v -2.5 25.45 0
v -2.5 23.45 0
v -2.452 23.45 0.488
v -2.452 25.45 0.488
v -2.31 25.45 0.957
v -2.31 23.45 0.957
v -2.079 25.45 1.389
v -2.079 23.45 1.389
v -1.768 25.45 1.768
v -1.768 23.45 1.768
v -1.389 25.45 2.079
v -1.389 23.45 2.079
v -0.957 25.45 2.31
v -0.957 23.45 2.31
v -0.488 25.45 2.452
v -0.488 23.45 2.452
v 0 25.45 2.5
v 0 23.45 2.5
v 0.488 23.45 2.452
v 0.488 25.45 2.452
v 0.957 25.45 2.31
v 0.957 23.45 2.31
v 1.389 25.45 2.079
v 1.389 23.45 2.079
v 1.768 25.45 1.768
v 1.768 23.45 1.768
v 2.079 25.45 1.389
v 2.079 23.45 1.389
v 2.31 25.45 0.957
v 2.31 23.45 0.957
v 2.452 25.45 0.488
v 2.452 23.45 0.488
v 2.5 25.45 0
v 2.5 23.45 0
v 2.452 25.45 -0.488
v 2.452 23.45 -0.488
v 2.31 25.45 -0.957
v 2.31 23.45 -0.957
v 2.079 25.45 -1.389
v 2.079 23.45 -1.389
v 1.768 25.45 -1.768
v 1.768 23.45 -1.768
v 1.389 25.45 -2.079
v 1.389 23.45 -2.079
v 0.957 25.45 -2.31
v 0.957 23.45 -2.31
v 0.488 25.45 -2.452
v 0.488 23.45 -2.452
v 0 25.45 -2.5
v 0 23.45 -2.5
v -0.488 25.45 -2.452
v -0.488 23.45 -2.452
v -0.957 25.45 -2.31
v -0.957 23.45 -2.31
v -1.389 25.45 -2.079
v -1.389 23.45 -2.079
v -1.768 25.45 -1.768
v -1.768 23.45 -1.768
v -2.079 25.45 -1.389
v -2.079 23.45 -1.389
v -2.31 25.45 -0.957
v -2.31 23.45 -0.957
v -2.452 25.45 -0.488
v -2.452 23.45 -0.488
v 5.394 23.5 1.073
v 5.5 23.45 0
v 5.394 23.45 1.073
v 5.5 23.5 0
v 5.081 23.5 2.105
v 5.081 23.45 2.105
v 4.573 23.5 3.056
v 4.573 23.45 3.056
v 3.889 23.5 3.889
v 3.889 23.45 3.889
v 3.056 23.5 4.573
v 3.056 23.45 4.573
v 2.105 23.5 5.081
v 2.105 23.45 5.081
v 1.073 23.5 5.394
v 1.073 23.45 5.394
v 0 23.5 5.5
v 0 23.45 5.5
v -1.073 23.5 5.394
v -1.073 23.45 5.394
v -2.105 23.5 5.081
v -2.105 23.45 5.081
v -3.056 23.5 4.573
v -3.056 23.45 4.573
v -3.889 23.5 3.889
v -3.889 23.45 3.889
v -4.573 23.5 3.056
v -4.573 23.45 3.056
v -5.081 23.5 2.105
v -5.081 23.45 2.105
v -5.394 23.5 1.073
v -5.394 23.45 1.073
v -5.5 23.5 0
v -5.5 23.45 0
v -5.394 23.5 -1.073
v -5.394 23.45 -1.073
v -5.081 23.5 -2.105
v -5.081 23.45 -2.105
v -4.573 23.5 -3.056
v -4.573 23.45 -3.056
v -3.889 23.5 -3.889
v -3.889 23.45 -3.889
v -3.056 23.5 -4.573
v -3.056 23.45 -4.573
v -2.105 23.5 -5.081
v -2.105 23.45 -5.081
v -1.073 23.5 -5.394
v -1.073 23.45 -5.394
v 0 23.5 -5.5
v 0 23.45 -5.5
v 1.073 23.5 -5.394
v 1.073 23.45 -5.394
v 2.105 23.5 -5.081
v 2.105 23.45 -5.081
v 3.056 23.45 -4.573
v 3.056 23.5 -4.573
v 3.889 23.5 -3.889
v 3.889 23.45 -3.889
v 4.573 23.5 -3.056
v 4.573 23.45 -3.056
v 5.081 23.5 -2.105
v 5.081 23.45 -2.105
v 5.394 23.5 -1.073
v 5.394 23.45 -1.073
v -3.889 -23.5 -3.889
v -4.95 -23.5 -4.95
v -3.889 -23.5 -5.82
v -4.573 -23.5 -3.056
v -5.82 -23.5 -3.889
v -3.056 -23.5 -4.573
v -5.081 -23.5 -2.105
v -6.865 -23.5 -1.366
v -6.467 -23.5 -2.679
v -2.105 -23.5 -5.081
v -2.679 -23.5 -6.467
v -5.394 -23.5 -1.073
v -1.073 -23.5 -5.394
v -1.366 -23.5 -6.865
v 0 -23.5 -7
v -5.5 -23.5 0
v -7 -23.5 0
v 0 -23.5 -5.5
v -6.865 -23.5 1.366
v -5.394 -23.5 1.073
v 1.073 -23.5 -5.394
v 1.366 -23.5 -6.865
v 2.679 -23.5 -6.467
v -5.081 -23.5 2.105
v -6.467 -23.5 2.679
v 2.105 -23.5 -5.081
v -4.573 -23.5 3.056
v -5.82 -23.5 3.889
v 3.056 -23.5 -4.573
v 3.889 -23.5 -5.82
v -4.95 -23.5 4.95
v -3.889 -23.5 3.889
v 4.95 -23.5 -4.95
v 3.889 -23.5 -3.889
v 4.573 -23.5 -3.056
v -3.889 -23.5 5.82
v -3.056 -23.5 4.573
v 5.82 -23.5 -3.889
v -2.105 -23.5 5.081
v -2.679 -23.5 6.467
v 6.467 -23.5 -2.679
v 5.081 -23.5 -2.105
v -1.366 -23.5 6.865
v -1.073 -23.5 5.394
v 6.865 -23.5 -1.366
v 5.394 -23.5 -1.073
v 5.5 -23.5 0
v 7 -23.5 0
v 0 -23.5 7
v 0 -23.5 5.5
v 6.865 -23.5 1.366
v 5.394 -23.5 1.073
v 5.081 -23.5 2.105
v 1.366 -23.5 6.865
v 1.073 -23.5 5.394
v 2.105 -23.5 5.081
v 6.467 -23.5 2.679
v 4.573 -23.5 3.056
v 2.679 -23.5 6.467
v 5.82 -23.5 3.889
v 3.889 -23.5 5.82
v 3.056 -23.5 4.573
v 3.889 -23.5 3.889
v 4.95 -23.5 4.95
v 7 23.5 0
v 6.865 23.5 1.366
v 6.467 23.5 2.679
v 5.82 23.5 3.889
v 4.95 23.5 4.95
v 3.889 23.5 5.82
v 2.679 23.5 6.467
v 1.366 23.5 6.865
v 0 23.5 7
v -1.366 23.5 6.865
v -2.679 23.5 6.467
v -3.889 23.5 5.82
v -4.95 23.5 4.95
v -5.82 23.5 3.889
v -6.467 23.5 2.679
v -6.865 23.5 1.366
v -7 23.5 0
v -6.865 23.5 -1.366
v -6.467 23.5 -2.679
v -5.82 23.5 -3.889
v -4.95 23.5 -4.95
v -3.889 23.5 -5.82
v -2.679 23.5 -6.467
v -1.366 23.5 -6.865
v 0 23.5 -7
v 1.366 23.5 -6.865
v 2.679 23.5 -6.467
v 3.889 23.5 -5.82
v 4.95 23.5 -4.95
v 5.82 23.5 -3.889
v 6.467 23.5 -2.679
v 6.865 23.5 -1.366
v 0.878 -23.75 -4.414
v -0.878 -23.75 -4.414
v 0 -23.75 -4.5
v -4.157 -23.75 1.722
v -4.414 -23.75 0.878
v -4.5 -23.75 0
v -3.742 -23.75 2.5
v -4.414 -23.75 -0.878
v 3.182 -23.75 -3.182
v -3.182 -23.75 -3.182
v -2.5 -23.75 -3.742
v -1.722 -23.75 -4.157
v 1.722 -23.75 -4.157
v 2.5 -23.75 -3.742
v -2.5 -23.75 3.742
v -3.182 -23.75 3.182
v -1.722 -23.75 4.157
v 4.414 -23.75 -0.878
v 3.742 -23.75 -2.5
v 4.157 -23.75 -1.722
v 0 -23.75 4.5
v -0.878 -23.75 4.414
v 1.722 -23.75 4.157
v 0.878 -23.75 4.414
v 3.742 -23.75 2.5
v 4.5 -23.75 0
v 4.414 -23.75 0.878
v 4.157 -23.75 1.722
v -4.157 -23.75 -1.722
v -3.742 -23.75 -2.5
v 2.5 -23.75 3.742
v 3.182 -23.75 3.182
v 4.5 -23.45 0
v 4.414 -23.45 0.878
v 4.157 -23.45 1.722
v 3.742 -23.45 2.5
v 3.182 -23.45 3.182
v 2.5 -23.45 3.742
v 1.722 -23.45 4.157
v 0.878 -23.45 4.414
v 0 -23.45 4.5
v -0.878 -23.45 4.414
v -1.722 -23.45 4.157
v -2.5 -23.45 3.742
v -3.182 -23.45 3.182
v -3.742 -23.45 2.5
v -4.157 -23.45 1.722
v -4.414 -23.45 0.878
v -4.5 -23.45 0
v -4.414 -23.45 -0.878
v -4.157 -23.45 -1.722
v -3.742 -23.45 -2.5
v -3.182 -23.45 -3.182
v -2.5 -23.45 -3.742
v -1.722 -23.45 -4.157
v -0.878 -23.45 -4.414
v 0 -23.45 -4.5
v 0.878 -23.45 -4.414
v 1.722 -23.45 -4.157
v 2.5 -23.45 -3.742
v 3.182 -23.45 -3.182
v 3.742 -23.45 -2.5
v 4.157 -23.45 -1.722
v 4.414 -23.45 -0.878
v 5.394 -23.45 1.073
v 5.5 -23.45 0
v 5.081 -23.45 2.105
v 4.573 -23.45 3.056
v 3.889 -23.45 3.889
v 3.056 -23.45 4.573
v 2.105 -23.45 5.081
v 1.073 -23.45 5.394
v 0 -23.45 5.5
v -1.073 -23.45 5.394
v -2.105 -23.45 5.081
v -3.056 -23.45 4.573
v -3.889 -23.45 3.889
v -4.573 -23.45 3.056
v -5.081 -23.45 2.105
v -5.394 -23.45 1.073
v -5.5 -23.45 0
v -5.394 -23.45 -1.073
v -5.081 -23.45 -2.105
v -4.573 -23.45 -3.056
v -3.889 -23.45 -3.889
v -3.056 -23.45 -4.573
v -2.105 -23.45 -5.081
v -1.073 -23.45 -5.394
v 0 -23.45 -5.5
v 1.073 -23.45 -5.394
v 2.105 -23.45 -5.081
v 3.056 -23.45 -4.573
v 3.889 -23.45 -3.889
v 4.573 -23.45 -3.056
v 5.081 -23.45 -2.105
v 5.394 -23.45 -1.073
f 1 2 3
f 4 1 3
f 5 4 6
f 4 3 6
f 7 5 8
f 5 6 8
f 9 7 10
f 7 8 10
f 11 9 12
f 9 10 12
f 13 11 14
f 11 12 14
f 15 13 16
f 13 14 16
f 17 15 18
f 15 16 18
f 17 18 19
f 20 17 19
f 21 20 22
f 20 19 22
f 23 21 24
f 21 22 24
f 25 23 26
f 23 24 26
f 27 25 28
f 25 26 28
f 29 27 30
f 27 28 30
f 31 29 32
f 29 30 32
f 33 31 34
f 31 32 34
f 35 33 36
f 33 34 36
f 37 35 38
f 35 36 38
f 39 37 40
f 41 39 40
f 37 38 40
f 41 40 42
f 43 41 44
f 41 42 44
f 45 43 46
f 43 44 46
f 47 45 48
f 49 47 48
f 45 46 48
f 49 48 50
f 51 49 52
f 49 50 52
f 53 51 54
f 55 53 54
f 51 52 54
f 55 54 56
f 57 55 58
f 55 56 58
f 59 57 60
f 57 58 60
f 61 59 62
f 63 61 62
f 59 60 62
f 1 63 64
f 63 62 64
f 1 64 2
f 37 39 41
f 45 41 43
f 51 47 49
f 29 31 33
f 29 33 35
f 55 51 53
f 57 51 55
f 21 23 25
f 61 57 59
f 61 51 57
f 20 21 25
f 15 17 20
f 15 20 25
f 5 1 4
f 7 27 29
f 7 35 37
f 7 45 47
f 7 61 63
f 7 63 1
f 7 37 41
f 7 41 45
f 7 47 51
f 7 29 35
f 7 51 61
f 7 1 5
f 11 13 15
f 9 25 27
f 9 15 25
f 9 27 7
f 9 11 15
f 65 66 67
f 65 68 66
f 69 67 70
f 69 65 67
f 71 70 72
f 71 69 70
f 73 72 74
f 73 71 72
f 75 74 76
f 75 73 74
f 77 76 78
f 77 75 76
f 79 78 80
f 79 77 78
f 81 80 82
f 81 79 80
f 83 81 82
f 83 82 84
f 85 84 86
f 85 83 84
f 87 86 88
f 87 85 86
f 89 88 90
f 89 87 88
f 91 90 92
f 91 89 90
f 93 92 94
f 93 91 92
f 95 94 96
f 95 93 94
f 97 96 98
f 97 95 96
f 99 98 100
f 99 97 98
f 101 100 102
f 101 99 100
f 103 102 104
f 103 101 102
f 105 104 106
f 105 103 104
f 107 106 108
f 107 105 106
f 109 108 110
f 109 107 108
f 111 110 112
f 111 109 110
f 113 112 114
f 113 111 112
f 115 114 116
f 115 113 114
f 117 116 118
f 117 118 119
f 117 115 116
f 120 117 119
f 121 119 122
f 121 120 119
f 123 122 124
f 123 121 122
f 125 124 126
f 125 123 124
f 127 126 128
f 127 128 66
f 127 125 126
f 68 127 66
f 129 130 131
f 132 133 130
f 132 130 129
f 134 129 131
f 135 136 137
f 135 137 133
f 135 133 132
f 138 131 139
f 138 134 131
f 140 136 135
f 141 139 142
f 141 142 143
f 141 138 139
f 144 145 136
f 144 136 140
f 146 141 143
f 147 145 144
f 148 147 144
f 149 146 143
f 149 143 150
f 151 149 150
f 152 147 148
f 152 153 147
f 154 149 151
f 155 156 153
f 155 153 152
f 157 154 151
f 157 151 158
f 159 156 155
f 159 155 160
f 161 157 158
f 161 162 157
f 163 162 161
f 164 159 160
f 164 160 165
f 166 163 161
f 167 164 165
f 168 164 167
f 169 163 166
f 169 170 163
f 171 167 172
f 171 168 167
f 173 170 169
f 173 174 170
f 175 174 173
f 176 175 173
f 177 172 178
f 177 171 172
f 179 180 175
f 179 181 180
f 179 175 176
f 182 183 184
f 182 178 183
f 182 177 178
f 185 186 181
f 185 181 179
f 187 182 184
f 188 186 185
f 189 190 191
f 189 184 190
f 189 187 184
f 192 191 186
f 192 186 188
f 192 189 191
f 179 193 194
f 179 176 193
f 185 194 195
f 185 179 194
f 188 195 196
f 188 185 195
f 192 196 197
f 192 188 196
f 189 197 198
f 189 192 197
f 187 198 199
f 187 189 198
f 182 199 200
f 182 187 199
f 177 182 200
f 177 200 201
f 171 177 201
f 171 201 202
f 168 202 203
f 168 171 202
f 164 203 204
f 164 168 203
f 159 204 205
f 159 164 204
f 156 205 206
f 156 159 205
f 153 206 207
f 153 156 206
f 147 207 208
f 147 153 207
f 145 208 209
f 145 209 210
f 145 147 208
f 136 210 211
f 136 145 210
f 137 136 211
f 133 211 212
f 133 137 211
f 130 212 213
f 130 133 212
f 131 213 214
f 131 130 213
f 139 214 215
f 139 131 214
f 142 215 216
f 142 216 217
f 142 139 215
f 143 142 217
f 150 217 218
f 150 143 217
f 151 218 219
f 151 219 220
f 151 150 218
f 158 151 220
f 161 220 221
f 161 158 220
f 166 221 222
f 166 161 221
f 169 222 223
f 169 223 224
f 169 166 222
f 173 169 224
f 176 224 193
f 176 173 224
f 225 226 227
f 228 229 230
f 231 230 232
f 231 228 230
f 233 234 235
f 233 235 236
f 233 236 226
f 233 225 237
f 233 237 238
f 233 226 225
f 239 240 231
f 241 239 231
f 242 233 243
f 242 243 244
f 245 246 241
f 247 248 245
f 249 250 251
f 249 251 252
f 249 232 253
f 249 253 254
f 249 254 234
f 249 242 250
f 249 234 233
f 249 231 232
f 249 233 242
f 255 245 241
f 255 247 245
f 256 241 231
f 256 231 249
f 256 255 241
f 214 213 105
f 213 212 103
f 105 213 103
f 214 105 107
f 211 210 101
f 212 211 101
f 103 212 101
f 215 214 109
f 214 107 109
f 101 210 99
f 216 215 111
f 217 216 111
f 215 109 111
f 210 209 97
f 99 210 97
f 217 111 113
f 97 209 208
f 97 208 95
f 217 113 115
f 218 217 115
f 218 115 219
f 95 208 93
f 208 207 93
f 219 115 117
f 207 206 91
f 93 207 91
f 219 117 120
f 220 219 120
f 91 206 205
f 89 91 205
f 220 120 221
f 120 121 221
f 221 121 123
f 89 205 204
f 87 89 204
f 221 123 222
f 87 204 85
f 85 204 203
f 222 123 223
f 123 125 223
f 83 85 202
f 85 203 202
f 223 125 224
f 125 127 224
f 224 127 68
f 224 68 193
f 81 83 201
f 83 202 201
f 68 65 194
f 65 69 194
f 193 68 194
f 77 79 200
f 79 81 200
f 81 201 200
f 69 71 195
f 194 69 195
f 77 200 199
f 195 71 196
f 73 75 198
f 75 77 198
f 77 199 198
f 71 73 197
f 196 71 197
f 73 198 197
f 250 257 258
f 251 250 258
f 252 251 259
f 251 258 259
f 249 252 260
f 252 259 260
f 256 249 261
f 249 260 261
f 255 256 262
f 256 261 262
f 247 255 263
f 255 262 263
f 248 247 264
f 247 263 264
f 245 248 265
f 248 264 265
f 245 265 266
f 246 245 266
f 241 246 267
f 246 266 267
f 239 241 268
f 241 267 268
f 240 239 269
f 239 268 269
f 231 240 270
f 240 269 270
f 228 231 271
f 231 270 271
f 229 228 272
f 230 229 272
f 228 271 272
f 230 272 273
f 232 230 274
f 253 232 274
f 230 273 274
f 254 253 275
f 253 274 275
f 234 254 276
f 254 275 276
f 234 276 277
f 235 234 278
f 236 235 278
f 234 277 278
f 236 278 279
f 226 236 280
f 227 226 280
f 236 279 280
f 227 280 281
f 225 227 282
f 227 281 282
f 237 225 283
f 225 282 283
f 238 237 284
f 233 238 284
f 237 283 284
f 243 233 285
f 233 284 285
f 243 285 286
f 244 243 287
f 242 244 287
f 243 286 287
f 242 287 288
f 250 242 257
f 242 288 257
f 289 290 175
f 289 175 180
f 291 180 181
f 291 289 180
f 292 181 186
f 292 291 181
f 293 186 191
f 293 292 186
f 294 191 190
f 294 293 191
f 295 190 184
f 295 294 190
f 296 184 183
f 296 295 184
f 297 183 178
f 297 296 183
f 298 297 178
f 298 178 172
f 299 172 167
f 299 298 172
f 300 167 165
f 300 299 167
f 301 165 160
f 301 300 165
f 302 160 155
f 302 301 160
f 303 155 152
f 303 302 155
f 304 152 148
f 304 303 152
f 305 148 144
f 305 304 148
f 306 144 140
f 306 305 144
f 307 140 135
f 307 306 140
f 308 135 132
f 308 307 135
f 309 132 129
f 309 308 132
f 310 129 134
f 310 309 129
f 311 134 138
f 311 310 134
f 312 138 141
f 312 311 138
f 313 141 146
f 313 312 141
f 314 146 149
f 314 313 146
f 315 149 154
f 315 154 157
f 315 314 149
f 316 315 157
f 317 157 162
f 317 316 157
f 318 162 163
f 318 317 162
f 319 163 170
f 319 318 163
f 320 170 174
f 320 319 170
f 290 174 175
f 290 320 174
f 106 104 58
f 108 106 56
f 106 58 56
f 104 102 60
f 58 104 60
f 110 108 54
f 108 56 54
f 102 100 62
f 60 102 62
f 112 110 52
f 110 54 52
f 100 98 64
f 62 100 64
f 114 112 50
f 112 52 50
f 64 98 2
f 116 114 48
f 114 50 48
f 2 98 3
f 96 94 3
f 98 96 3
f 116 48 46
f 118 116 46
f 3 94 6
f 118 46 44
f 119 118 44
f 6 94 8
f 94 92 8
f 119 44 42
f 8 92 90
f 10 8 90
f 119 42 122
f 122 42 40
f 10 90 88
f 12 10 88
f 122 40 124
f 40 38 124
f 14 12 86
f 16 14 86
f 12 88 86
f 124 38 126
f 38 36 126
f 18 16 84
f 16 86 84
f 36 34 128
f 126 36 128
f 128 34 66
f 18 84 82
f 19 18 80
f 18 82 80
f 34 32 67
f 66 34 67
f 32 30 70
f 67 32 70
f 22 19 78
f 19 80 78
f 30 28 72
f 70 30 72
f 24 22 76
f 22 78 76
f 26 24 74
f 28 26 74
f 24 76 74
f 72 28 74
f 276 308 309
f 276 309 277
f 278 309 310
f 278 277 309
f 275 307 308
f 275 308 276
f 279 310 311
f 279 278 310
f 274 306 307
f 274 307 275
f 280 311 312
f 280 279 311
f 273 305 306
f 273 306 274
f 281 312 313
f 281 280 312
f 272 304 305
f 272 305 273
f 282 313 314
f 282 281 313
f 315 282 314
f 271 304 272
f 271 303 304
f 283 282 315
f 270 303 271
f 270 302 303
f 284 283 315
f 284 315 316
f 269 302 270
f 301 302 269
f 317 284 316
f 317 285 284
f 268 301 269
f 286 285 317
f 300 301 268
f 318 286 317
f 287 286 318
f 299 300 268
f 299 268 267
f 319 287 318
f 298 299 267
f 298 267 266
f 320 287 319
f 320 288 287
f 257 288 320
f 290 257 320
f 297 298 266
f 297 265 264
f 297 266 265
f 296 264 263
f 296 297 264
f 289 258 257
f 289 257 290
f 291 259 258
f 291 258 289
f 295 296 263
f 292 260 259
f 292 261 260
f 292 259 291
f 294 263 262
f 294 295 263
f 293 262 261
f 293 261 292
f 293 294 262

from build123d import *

# Parameters (mm, degrees)
F0_R     = 7
F0_R_2   = 5.5
F1_DEPTH = 23.5
F2_DEPTH = 23.45
F3_R     = 4.5
F4_DEPTH = 0.3
F5_R     = 2.5
F6_DEPTH = 2


with BuildPart() as f1:
    # F0 (on Front) → F1 (new body, symmetric)
    with BuildSketch(Plane.XZ):
        Circle(F0_R)
        Circle(F0_R_2, mode=Mode.SUBTRACT)
    extrude(amount=F1_DEPTH, both=True)

    # F0 (on Front) → F2 (join, symmetric)
    with BuildSketch(Plane.XZ):
        Circle(F0_R_2)
    extrude(amount=F2_DEPTH, both=True)

    # F3 (on face) → F4 (join)
    with BuildSketch(Plane.XZ.offset(23.45)):
        Circle(F3_R)
    extrude(amount=F4_DEPTH)

    # F5 (on face) → F6 (join)
    with BuildSketch(Plane(origin=(0, 23.45, 0), x_dir=(-1, 0, 0), z_dir=(0, 1, 0))):
        Circle(F5_R)
    extrude(amount=F6_DEPTH)


solid = f1.part
